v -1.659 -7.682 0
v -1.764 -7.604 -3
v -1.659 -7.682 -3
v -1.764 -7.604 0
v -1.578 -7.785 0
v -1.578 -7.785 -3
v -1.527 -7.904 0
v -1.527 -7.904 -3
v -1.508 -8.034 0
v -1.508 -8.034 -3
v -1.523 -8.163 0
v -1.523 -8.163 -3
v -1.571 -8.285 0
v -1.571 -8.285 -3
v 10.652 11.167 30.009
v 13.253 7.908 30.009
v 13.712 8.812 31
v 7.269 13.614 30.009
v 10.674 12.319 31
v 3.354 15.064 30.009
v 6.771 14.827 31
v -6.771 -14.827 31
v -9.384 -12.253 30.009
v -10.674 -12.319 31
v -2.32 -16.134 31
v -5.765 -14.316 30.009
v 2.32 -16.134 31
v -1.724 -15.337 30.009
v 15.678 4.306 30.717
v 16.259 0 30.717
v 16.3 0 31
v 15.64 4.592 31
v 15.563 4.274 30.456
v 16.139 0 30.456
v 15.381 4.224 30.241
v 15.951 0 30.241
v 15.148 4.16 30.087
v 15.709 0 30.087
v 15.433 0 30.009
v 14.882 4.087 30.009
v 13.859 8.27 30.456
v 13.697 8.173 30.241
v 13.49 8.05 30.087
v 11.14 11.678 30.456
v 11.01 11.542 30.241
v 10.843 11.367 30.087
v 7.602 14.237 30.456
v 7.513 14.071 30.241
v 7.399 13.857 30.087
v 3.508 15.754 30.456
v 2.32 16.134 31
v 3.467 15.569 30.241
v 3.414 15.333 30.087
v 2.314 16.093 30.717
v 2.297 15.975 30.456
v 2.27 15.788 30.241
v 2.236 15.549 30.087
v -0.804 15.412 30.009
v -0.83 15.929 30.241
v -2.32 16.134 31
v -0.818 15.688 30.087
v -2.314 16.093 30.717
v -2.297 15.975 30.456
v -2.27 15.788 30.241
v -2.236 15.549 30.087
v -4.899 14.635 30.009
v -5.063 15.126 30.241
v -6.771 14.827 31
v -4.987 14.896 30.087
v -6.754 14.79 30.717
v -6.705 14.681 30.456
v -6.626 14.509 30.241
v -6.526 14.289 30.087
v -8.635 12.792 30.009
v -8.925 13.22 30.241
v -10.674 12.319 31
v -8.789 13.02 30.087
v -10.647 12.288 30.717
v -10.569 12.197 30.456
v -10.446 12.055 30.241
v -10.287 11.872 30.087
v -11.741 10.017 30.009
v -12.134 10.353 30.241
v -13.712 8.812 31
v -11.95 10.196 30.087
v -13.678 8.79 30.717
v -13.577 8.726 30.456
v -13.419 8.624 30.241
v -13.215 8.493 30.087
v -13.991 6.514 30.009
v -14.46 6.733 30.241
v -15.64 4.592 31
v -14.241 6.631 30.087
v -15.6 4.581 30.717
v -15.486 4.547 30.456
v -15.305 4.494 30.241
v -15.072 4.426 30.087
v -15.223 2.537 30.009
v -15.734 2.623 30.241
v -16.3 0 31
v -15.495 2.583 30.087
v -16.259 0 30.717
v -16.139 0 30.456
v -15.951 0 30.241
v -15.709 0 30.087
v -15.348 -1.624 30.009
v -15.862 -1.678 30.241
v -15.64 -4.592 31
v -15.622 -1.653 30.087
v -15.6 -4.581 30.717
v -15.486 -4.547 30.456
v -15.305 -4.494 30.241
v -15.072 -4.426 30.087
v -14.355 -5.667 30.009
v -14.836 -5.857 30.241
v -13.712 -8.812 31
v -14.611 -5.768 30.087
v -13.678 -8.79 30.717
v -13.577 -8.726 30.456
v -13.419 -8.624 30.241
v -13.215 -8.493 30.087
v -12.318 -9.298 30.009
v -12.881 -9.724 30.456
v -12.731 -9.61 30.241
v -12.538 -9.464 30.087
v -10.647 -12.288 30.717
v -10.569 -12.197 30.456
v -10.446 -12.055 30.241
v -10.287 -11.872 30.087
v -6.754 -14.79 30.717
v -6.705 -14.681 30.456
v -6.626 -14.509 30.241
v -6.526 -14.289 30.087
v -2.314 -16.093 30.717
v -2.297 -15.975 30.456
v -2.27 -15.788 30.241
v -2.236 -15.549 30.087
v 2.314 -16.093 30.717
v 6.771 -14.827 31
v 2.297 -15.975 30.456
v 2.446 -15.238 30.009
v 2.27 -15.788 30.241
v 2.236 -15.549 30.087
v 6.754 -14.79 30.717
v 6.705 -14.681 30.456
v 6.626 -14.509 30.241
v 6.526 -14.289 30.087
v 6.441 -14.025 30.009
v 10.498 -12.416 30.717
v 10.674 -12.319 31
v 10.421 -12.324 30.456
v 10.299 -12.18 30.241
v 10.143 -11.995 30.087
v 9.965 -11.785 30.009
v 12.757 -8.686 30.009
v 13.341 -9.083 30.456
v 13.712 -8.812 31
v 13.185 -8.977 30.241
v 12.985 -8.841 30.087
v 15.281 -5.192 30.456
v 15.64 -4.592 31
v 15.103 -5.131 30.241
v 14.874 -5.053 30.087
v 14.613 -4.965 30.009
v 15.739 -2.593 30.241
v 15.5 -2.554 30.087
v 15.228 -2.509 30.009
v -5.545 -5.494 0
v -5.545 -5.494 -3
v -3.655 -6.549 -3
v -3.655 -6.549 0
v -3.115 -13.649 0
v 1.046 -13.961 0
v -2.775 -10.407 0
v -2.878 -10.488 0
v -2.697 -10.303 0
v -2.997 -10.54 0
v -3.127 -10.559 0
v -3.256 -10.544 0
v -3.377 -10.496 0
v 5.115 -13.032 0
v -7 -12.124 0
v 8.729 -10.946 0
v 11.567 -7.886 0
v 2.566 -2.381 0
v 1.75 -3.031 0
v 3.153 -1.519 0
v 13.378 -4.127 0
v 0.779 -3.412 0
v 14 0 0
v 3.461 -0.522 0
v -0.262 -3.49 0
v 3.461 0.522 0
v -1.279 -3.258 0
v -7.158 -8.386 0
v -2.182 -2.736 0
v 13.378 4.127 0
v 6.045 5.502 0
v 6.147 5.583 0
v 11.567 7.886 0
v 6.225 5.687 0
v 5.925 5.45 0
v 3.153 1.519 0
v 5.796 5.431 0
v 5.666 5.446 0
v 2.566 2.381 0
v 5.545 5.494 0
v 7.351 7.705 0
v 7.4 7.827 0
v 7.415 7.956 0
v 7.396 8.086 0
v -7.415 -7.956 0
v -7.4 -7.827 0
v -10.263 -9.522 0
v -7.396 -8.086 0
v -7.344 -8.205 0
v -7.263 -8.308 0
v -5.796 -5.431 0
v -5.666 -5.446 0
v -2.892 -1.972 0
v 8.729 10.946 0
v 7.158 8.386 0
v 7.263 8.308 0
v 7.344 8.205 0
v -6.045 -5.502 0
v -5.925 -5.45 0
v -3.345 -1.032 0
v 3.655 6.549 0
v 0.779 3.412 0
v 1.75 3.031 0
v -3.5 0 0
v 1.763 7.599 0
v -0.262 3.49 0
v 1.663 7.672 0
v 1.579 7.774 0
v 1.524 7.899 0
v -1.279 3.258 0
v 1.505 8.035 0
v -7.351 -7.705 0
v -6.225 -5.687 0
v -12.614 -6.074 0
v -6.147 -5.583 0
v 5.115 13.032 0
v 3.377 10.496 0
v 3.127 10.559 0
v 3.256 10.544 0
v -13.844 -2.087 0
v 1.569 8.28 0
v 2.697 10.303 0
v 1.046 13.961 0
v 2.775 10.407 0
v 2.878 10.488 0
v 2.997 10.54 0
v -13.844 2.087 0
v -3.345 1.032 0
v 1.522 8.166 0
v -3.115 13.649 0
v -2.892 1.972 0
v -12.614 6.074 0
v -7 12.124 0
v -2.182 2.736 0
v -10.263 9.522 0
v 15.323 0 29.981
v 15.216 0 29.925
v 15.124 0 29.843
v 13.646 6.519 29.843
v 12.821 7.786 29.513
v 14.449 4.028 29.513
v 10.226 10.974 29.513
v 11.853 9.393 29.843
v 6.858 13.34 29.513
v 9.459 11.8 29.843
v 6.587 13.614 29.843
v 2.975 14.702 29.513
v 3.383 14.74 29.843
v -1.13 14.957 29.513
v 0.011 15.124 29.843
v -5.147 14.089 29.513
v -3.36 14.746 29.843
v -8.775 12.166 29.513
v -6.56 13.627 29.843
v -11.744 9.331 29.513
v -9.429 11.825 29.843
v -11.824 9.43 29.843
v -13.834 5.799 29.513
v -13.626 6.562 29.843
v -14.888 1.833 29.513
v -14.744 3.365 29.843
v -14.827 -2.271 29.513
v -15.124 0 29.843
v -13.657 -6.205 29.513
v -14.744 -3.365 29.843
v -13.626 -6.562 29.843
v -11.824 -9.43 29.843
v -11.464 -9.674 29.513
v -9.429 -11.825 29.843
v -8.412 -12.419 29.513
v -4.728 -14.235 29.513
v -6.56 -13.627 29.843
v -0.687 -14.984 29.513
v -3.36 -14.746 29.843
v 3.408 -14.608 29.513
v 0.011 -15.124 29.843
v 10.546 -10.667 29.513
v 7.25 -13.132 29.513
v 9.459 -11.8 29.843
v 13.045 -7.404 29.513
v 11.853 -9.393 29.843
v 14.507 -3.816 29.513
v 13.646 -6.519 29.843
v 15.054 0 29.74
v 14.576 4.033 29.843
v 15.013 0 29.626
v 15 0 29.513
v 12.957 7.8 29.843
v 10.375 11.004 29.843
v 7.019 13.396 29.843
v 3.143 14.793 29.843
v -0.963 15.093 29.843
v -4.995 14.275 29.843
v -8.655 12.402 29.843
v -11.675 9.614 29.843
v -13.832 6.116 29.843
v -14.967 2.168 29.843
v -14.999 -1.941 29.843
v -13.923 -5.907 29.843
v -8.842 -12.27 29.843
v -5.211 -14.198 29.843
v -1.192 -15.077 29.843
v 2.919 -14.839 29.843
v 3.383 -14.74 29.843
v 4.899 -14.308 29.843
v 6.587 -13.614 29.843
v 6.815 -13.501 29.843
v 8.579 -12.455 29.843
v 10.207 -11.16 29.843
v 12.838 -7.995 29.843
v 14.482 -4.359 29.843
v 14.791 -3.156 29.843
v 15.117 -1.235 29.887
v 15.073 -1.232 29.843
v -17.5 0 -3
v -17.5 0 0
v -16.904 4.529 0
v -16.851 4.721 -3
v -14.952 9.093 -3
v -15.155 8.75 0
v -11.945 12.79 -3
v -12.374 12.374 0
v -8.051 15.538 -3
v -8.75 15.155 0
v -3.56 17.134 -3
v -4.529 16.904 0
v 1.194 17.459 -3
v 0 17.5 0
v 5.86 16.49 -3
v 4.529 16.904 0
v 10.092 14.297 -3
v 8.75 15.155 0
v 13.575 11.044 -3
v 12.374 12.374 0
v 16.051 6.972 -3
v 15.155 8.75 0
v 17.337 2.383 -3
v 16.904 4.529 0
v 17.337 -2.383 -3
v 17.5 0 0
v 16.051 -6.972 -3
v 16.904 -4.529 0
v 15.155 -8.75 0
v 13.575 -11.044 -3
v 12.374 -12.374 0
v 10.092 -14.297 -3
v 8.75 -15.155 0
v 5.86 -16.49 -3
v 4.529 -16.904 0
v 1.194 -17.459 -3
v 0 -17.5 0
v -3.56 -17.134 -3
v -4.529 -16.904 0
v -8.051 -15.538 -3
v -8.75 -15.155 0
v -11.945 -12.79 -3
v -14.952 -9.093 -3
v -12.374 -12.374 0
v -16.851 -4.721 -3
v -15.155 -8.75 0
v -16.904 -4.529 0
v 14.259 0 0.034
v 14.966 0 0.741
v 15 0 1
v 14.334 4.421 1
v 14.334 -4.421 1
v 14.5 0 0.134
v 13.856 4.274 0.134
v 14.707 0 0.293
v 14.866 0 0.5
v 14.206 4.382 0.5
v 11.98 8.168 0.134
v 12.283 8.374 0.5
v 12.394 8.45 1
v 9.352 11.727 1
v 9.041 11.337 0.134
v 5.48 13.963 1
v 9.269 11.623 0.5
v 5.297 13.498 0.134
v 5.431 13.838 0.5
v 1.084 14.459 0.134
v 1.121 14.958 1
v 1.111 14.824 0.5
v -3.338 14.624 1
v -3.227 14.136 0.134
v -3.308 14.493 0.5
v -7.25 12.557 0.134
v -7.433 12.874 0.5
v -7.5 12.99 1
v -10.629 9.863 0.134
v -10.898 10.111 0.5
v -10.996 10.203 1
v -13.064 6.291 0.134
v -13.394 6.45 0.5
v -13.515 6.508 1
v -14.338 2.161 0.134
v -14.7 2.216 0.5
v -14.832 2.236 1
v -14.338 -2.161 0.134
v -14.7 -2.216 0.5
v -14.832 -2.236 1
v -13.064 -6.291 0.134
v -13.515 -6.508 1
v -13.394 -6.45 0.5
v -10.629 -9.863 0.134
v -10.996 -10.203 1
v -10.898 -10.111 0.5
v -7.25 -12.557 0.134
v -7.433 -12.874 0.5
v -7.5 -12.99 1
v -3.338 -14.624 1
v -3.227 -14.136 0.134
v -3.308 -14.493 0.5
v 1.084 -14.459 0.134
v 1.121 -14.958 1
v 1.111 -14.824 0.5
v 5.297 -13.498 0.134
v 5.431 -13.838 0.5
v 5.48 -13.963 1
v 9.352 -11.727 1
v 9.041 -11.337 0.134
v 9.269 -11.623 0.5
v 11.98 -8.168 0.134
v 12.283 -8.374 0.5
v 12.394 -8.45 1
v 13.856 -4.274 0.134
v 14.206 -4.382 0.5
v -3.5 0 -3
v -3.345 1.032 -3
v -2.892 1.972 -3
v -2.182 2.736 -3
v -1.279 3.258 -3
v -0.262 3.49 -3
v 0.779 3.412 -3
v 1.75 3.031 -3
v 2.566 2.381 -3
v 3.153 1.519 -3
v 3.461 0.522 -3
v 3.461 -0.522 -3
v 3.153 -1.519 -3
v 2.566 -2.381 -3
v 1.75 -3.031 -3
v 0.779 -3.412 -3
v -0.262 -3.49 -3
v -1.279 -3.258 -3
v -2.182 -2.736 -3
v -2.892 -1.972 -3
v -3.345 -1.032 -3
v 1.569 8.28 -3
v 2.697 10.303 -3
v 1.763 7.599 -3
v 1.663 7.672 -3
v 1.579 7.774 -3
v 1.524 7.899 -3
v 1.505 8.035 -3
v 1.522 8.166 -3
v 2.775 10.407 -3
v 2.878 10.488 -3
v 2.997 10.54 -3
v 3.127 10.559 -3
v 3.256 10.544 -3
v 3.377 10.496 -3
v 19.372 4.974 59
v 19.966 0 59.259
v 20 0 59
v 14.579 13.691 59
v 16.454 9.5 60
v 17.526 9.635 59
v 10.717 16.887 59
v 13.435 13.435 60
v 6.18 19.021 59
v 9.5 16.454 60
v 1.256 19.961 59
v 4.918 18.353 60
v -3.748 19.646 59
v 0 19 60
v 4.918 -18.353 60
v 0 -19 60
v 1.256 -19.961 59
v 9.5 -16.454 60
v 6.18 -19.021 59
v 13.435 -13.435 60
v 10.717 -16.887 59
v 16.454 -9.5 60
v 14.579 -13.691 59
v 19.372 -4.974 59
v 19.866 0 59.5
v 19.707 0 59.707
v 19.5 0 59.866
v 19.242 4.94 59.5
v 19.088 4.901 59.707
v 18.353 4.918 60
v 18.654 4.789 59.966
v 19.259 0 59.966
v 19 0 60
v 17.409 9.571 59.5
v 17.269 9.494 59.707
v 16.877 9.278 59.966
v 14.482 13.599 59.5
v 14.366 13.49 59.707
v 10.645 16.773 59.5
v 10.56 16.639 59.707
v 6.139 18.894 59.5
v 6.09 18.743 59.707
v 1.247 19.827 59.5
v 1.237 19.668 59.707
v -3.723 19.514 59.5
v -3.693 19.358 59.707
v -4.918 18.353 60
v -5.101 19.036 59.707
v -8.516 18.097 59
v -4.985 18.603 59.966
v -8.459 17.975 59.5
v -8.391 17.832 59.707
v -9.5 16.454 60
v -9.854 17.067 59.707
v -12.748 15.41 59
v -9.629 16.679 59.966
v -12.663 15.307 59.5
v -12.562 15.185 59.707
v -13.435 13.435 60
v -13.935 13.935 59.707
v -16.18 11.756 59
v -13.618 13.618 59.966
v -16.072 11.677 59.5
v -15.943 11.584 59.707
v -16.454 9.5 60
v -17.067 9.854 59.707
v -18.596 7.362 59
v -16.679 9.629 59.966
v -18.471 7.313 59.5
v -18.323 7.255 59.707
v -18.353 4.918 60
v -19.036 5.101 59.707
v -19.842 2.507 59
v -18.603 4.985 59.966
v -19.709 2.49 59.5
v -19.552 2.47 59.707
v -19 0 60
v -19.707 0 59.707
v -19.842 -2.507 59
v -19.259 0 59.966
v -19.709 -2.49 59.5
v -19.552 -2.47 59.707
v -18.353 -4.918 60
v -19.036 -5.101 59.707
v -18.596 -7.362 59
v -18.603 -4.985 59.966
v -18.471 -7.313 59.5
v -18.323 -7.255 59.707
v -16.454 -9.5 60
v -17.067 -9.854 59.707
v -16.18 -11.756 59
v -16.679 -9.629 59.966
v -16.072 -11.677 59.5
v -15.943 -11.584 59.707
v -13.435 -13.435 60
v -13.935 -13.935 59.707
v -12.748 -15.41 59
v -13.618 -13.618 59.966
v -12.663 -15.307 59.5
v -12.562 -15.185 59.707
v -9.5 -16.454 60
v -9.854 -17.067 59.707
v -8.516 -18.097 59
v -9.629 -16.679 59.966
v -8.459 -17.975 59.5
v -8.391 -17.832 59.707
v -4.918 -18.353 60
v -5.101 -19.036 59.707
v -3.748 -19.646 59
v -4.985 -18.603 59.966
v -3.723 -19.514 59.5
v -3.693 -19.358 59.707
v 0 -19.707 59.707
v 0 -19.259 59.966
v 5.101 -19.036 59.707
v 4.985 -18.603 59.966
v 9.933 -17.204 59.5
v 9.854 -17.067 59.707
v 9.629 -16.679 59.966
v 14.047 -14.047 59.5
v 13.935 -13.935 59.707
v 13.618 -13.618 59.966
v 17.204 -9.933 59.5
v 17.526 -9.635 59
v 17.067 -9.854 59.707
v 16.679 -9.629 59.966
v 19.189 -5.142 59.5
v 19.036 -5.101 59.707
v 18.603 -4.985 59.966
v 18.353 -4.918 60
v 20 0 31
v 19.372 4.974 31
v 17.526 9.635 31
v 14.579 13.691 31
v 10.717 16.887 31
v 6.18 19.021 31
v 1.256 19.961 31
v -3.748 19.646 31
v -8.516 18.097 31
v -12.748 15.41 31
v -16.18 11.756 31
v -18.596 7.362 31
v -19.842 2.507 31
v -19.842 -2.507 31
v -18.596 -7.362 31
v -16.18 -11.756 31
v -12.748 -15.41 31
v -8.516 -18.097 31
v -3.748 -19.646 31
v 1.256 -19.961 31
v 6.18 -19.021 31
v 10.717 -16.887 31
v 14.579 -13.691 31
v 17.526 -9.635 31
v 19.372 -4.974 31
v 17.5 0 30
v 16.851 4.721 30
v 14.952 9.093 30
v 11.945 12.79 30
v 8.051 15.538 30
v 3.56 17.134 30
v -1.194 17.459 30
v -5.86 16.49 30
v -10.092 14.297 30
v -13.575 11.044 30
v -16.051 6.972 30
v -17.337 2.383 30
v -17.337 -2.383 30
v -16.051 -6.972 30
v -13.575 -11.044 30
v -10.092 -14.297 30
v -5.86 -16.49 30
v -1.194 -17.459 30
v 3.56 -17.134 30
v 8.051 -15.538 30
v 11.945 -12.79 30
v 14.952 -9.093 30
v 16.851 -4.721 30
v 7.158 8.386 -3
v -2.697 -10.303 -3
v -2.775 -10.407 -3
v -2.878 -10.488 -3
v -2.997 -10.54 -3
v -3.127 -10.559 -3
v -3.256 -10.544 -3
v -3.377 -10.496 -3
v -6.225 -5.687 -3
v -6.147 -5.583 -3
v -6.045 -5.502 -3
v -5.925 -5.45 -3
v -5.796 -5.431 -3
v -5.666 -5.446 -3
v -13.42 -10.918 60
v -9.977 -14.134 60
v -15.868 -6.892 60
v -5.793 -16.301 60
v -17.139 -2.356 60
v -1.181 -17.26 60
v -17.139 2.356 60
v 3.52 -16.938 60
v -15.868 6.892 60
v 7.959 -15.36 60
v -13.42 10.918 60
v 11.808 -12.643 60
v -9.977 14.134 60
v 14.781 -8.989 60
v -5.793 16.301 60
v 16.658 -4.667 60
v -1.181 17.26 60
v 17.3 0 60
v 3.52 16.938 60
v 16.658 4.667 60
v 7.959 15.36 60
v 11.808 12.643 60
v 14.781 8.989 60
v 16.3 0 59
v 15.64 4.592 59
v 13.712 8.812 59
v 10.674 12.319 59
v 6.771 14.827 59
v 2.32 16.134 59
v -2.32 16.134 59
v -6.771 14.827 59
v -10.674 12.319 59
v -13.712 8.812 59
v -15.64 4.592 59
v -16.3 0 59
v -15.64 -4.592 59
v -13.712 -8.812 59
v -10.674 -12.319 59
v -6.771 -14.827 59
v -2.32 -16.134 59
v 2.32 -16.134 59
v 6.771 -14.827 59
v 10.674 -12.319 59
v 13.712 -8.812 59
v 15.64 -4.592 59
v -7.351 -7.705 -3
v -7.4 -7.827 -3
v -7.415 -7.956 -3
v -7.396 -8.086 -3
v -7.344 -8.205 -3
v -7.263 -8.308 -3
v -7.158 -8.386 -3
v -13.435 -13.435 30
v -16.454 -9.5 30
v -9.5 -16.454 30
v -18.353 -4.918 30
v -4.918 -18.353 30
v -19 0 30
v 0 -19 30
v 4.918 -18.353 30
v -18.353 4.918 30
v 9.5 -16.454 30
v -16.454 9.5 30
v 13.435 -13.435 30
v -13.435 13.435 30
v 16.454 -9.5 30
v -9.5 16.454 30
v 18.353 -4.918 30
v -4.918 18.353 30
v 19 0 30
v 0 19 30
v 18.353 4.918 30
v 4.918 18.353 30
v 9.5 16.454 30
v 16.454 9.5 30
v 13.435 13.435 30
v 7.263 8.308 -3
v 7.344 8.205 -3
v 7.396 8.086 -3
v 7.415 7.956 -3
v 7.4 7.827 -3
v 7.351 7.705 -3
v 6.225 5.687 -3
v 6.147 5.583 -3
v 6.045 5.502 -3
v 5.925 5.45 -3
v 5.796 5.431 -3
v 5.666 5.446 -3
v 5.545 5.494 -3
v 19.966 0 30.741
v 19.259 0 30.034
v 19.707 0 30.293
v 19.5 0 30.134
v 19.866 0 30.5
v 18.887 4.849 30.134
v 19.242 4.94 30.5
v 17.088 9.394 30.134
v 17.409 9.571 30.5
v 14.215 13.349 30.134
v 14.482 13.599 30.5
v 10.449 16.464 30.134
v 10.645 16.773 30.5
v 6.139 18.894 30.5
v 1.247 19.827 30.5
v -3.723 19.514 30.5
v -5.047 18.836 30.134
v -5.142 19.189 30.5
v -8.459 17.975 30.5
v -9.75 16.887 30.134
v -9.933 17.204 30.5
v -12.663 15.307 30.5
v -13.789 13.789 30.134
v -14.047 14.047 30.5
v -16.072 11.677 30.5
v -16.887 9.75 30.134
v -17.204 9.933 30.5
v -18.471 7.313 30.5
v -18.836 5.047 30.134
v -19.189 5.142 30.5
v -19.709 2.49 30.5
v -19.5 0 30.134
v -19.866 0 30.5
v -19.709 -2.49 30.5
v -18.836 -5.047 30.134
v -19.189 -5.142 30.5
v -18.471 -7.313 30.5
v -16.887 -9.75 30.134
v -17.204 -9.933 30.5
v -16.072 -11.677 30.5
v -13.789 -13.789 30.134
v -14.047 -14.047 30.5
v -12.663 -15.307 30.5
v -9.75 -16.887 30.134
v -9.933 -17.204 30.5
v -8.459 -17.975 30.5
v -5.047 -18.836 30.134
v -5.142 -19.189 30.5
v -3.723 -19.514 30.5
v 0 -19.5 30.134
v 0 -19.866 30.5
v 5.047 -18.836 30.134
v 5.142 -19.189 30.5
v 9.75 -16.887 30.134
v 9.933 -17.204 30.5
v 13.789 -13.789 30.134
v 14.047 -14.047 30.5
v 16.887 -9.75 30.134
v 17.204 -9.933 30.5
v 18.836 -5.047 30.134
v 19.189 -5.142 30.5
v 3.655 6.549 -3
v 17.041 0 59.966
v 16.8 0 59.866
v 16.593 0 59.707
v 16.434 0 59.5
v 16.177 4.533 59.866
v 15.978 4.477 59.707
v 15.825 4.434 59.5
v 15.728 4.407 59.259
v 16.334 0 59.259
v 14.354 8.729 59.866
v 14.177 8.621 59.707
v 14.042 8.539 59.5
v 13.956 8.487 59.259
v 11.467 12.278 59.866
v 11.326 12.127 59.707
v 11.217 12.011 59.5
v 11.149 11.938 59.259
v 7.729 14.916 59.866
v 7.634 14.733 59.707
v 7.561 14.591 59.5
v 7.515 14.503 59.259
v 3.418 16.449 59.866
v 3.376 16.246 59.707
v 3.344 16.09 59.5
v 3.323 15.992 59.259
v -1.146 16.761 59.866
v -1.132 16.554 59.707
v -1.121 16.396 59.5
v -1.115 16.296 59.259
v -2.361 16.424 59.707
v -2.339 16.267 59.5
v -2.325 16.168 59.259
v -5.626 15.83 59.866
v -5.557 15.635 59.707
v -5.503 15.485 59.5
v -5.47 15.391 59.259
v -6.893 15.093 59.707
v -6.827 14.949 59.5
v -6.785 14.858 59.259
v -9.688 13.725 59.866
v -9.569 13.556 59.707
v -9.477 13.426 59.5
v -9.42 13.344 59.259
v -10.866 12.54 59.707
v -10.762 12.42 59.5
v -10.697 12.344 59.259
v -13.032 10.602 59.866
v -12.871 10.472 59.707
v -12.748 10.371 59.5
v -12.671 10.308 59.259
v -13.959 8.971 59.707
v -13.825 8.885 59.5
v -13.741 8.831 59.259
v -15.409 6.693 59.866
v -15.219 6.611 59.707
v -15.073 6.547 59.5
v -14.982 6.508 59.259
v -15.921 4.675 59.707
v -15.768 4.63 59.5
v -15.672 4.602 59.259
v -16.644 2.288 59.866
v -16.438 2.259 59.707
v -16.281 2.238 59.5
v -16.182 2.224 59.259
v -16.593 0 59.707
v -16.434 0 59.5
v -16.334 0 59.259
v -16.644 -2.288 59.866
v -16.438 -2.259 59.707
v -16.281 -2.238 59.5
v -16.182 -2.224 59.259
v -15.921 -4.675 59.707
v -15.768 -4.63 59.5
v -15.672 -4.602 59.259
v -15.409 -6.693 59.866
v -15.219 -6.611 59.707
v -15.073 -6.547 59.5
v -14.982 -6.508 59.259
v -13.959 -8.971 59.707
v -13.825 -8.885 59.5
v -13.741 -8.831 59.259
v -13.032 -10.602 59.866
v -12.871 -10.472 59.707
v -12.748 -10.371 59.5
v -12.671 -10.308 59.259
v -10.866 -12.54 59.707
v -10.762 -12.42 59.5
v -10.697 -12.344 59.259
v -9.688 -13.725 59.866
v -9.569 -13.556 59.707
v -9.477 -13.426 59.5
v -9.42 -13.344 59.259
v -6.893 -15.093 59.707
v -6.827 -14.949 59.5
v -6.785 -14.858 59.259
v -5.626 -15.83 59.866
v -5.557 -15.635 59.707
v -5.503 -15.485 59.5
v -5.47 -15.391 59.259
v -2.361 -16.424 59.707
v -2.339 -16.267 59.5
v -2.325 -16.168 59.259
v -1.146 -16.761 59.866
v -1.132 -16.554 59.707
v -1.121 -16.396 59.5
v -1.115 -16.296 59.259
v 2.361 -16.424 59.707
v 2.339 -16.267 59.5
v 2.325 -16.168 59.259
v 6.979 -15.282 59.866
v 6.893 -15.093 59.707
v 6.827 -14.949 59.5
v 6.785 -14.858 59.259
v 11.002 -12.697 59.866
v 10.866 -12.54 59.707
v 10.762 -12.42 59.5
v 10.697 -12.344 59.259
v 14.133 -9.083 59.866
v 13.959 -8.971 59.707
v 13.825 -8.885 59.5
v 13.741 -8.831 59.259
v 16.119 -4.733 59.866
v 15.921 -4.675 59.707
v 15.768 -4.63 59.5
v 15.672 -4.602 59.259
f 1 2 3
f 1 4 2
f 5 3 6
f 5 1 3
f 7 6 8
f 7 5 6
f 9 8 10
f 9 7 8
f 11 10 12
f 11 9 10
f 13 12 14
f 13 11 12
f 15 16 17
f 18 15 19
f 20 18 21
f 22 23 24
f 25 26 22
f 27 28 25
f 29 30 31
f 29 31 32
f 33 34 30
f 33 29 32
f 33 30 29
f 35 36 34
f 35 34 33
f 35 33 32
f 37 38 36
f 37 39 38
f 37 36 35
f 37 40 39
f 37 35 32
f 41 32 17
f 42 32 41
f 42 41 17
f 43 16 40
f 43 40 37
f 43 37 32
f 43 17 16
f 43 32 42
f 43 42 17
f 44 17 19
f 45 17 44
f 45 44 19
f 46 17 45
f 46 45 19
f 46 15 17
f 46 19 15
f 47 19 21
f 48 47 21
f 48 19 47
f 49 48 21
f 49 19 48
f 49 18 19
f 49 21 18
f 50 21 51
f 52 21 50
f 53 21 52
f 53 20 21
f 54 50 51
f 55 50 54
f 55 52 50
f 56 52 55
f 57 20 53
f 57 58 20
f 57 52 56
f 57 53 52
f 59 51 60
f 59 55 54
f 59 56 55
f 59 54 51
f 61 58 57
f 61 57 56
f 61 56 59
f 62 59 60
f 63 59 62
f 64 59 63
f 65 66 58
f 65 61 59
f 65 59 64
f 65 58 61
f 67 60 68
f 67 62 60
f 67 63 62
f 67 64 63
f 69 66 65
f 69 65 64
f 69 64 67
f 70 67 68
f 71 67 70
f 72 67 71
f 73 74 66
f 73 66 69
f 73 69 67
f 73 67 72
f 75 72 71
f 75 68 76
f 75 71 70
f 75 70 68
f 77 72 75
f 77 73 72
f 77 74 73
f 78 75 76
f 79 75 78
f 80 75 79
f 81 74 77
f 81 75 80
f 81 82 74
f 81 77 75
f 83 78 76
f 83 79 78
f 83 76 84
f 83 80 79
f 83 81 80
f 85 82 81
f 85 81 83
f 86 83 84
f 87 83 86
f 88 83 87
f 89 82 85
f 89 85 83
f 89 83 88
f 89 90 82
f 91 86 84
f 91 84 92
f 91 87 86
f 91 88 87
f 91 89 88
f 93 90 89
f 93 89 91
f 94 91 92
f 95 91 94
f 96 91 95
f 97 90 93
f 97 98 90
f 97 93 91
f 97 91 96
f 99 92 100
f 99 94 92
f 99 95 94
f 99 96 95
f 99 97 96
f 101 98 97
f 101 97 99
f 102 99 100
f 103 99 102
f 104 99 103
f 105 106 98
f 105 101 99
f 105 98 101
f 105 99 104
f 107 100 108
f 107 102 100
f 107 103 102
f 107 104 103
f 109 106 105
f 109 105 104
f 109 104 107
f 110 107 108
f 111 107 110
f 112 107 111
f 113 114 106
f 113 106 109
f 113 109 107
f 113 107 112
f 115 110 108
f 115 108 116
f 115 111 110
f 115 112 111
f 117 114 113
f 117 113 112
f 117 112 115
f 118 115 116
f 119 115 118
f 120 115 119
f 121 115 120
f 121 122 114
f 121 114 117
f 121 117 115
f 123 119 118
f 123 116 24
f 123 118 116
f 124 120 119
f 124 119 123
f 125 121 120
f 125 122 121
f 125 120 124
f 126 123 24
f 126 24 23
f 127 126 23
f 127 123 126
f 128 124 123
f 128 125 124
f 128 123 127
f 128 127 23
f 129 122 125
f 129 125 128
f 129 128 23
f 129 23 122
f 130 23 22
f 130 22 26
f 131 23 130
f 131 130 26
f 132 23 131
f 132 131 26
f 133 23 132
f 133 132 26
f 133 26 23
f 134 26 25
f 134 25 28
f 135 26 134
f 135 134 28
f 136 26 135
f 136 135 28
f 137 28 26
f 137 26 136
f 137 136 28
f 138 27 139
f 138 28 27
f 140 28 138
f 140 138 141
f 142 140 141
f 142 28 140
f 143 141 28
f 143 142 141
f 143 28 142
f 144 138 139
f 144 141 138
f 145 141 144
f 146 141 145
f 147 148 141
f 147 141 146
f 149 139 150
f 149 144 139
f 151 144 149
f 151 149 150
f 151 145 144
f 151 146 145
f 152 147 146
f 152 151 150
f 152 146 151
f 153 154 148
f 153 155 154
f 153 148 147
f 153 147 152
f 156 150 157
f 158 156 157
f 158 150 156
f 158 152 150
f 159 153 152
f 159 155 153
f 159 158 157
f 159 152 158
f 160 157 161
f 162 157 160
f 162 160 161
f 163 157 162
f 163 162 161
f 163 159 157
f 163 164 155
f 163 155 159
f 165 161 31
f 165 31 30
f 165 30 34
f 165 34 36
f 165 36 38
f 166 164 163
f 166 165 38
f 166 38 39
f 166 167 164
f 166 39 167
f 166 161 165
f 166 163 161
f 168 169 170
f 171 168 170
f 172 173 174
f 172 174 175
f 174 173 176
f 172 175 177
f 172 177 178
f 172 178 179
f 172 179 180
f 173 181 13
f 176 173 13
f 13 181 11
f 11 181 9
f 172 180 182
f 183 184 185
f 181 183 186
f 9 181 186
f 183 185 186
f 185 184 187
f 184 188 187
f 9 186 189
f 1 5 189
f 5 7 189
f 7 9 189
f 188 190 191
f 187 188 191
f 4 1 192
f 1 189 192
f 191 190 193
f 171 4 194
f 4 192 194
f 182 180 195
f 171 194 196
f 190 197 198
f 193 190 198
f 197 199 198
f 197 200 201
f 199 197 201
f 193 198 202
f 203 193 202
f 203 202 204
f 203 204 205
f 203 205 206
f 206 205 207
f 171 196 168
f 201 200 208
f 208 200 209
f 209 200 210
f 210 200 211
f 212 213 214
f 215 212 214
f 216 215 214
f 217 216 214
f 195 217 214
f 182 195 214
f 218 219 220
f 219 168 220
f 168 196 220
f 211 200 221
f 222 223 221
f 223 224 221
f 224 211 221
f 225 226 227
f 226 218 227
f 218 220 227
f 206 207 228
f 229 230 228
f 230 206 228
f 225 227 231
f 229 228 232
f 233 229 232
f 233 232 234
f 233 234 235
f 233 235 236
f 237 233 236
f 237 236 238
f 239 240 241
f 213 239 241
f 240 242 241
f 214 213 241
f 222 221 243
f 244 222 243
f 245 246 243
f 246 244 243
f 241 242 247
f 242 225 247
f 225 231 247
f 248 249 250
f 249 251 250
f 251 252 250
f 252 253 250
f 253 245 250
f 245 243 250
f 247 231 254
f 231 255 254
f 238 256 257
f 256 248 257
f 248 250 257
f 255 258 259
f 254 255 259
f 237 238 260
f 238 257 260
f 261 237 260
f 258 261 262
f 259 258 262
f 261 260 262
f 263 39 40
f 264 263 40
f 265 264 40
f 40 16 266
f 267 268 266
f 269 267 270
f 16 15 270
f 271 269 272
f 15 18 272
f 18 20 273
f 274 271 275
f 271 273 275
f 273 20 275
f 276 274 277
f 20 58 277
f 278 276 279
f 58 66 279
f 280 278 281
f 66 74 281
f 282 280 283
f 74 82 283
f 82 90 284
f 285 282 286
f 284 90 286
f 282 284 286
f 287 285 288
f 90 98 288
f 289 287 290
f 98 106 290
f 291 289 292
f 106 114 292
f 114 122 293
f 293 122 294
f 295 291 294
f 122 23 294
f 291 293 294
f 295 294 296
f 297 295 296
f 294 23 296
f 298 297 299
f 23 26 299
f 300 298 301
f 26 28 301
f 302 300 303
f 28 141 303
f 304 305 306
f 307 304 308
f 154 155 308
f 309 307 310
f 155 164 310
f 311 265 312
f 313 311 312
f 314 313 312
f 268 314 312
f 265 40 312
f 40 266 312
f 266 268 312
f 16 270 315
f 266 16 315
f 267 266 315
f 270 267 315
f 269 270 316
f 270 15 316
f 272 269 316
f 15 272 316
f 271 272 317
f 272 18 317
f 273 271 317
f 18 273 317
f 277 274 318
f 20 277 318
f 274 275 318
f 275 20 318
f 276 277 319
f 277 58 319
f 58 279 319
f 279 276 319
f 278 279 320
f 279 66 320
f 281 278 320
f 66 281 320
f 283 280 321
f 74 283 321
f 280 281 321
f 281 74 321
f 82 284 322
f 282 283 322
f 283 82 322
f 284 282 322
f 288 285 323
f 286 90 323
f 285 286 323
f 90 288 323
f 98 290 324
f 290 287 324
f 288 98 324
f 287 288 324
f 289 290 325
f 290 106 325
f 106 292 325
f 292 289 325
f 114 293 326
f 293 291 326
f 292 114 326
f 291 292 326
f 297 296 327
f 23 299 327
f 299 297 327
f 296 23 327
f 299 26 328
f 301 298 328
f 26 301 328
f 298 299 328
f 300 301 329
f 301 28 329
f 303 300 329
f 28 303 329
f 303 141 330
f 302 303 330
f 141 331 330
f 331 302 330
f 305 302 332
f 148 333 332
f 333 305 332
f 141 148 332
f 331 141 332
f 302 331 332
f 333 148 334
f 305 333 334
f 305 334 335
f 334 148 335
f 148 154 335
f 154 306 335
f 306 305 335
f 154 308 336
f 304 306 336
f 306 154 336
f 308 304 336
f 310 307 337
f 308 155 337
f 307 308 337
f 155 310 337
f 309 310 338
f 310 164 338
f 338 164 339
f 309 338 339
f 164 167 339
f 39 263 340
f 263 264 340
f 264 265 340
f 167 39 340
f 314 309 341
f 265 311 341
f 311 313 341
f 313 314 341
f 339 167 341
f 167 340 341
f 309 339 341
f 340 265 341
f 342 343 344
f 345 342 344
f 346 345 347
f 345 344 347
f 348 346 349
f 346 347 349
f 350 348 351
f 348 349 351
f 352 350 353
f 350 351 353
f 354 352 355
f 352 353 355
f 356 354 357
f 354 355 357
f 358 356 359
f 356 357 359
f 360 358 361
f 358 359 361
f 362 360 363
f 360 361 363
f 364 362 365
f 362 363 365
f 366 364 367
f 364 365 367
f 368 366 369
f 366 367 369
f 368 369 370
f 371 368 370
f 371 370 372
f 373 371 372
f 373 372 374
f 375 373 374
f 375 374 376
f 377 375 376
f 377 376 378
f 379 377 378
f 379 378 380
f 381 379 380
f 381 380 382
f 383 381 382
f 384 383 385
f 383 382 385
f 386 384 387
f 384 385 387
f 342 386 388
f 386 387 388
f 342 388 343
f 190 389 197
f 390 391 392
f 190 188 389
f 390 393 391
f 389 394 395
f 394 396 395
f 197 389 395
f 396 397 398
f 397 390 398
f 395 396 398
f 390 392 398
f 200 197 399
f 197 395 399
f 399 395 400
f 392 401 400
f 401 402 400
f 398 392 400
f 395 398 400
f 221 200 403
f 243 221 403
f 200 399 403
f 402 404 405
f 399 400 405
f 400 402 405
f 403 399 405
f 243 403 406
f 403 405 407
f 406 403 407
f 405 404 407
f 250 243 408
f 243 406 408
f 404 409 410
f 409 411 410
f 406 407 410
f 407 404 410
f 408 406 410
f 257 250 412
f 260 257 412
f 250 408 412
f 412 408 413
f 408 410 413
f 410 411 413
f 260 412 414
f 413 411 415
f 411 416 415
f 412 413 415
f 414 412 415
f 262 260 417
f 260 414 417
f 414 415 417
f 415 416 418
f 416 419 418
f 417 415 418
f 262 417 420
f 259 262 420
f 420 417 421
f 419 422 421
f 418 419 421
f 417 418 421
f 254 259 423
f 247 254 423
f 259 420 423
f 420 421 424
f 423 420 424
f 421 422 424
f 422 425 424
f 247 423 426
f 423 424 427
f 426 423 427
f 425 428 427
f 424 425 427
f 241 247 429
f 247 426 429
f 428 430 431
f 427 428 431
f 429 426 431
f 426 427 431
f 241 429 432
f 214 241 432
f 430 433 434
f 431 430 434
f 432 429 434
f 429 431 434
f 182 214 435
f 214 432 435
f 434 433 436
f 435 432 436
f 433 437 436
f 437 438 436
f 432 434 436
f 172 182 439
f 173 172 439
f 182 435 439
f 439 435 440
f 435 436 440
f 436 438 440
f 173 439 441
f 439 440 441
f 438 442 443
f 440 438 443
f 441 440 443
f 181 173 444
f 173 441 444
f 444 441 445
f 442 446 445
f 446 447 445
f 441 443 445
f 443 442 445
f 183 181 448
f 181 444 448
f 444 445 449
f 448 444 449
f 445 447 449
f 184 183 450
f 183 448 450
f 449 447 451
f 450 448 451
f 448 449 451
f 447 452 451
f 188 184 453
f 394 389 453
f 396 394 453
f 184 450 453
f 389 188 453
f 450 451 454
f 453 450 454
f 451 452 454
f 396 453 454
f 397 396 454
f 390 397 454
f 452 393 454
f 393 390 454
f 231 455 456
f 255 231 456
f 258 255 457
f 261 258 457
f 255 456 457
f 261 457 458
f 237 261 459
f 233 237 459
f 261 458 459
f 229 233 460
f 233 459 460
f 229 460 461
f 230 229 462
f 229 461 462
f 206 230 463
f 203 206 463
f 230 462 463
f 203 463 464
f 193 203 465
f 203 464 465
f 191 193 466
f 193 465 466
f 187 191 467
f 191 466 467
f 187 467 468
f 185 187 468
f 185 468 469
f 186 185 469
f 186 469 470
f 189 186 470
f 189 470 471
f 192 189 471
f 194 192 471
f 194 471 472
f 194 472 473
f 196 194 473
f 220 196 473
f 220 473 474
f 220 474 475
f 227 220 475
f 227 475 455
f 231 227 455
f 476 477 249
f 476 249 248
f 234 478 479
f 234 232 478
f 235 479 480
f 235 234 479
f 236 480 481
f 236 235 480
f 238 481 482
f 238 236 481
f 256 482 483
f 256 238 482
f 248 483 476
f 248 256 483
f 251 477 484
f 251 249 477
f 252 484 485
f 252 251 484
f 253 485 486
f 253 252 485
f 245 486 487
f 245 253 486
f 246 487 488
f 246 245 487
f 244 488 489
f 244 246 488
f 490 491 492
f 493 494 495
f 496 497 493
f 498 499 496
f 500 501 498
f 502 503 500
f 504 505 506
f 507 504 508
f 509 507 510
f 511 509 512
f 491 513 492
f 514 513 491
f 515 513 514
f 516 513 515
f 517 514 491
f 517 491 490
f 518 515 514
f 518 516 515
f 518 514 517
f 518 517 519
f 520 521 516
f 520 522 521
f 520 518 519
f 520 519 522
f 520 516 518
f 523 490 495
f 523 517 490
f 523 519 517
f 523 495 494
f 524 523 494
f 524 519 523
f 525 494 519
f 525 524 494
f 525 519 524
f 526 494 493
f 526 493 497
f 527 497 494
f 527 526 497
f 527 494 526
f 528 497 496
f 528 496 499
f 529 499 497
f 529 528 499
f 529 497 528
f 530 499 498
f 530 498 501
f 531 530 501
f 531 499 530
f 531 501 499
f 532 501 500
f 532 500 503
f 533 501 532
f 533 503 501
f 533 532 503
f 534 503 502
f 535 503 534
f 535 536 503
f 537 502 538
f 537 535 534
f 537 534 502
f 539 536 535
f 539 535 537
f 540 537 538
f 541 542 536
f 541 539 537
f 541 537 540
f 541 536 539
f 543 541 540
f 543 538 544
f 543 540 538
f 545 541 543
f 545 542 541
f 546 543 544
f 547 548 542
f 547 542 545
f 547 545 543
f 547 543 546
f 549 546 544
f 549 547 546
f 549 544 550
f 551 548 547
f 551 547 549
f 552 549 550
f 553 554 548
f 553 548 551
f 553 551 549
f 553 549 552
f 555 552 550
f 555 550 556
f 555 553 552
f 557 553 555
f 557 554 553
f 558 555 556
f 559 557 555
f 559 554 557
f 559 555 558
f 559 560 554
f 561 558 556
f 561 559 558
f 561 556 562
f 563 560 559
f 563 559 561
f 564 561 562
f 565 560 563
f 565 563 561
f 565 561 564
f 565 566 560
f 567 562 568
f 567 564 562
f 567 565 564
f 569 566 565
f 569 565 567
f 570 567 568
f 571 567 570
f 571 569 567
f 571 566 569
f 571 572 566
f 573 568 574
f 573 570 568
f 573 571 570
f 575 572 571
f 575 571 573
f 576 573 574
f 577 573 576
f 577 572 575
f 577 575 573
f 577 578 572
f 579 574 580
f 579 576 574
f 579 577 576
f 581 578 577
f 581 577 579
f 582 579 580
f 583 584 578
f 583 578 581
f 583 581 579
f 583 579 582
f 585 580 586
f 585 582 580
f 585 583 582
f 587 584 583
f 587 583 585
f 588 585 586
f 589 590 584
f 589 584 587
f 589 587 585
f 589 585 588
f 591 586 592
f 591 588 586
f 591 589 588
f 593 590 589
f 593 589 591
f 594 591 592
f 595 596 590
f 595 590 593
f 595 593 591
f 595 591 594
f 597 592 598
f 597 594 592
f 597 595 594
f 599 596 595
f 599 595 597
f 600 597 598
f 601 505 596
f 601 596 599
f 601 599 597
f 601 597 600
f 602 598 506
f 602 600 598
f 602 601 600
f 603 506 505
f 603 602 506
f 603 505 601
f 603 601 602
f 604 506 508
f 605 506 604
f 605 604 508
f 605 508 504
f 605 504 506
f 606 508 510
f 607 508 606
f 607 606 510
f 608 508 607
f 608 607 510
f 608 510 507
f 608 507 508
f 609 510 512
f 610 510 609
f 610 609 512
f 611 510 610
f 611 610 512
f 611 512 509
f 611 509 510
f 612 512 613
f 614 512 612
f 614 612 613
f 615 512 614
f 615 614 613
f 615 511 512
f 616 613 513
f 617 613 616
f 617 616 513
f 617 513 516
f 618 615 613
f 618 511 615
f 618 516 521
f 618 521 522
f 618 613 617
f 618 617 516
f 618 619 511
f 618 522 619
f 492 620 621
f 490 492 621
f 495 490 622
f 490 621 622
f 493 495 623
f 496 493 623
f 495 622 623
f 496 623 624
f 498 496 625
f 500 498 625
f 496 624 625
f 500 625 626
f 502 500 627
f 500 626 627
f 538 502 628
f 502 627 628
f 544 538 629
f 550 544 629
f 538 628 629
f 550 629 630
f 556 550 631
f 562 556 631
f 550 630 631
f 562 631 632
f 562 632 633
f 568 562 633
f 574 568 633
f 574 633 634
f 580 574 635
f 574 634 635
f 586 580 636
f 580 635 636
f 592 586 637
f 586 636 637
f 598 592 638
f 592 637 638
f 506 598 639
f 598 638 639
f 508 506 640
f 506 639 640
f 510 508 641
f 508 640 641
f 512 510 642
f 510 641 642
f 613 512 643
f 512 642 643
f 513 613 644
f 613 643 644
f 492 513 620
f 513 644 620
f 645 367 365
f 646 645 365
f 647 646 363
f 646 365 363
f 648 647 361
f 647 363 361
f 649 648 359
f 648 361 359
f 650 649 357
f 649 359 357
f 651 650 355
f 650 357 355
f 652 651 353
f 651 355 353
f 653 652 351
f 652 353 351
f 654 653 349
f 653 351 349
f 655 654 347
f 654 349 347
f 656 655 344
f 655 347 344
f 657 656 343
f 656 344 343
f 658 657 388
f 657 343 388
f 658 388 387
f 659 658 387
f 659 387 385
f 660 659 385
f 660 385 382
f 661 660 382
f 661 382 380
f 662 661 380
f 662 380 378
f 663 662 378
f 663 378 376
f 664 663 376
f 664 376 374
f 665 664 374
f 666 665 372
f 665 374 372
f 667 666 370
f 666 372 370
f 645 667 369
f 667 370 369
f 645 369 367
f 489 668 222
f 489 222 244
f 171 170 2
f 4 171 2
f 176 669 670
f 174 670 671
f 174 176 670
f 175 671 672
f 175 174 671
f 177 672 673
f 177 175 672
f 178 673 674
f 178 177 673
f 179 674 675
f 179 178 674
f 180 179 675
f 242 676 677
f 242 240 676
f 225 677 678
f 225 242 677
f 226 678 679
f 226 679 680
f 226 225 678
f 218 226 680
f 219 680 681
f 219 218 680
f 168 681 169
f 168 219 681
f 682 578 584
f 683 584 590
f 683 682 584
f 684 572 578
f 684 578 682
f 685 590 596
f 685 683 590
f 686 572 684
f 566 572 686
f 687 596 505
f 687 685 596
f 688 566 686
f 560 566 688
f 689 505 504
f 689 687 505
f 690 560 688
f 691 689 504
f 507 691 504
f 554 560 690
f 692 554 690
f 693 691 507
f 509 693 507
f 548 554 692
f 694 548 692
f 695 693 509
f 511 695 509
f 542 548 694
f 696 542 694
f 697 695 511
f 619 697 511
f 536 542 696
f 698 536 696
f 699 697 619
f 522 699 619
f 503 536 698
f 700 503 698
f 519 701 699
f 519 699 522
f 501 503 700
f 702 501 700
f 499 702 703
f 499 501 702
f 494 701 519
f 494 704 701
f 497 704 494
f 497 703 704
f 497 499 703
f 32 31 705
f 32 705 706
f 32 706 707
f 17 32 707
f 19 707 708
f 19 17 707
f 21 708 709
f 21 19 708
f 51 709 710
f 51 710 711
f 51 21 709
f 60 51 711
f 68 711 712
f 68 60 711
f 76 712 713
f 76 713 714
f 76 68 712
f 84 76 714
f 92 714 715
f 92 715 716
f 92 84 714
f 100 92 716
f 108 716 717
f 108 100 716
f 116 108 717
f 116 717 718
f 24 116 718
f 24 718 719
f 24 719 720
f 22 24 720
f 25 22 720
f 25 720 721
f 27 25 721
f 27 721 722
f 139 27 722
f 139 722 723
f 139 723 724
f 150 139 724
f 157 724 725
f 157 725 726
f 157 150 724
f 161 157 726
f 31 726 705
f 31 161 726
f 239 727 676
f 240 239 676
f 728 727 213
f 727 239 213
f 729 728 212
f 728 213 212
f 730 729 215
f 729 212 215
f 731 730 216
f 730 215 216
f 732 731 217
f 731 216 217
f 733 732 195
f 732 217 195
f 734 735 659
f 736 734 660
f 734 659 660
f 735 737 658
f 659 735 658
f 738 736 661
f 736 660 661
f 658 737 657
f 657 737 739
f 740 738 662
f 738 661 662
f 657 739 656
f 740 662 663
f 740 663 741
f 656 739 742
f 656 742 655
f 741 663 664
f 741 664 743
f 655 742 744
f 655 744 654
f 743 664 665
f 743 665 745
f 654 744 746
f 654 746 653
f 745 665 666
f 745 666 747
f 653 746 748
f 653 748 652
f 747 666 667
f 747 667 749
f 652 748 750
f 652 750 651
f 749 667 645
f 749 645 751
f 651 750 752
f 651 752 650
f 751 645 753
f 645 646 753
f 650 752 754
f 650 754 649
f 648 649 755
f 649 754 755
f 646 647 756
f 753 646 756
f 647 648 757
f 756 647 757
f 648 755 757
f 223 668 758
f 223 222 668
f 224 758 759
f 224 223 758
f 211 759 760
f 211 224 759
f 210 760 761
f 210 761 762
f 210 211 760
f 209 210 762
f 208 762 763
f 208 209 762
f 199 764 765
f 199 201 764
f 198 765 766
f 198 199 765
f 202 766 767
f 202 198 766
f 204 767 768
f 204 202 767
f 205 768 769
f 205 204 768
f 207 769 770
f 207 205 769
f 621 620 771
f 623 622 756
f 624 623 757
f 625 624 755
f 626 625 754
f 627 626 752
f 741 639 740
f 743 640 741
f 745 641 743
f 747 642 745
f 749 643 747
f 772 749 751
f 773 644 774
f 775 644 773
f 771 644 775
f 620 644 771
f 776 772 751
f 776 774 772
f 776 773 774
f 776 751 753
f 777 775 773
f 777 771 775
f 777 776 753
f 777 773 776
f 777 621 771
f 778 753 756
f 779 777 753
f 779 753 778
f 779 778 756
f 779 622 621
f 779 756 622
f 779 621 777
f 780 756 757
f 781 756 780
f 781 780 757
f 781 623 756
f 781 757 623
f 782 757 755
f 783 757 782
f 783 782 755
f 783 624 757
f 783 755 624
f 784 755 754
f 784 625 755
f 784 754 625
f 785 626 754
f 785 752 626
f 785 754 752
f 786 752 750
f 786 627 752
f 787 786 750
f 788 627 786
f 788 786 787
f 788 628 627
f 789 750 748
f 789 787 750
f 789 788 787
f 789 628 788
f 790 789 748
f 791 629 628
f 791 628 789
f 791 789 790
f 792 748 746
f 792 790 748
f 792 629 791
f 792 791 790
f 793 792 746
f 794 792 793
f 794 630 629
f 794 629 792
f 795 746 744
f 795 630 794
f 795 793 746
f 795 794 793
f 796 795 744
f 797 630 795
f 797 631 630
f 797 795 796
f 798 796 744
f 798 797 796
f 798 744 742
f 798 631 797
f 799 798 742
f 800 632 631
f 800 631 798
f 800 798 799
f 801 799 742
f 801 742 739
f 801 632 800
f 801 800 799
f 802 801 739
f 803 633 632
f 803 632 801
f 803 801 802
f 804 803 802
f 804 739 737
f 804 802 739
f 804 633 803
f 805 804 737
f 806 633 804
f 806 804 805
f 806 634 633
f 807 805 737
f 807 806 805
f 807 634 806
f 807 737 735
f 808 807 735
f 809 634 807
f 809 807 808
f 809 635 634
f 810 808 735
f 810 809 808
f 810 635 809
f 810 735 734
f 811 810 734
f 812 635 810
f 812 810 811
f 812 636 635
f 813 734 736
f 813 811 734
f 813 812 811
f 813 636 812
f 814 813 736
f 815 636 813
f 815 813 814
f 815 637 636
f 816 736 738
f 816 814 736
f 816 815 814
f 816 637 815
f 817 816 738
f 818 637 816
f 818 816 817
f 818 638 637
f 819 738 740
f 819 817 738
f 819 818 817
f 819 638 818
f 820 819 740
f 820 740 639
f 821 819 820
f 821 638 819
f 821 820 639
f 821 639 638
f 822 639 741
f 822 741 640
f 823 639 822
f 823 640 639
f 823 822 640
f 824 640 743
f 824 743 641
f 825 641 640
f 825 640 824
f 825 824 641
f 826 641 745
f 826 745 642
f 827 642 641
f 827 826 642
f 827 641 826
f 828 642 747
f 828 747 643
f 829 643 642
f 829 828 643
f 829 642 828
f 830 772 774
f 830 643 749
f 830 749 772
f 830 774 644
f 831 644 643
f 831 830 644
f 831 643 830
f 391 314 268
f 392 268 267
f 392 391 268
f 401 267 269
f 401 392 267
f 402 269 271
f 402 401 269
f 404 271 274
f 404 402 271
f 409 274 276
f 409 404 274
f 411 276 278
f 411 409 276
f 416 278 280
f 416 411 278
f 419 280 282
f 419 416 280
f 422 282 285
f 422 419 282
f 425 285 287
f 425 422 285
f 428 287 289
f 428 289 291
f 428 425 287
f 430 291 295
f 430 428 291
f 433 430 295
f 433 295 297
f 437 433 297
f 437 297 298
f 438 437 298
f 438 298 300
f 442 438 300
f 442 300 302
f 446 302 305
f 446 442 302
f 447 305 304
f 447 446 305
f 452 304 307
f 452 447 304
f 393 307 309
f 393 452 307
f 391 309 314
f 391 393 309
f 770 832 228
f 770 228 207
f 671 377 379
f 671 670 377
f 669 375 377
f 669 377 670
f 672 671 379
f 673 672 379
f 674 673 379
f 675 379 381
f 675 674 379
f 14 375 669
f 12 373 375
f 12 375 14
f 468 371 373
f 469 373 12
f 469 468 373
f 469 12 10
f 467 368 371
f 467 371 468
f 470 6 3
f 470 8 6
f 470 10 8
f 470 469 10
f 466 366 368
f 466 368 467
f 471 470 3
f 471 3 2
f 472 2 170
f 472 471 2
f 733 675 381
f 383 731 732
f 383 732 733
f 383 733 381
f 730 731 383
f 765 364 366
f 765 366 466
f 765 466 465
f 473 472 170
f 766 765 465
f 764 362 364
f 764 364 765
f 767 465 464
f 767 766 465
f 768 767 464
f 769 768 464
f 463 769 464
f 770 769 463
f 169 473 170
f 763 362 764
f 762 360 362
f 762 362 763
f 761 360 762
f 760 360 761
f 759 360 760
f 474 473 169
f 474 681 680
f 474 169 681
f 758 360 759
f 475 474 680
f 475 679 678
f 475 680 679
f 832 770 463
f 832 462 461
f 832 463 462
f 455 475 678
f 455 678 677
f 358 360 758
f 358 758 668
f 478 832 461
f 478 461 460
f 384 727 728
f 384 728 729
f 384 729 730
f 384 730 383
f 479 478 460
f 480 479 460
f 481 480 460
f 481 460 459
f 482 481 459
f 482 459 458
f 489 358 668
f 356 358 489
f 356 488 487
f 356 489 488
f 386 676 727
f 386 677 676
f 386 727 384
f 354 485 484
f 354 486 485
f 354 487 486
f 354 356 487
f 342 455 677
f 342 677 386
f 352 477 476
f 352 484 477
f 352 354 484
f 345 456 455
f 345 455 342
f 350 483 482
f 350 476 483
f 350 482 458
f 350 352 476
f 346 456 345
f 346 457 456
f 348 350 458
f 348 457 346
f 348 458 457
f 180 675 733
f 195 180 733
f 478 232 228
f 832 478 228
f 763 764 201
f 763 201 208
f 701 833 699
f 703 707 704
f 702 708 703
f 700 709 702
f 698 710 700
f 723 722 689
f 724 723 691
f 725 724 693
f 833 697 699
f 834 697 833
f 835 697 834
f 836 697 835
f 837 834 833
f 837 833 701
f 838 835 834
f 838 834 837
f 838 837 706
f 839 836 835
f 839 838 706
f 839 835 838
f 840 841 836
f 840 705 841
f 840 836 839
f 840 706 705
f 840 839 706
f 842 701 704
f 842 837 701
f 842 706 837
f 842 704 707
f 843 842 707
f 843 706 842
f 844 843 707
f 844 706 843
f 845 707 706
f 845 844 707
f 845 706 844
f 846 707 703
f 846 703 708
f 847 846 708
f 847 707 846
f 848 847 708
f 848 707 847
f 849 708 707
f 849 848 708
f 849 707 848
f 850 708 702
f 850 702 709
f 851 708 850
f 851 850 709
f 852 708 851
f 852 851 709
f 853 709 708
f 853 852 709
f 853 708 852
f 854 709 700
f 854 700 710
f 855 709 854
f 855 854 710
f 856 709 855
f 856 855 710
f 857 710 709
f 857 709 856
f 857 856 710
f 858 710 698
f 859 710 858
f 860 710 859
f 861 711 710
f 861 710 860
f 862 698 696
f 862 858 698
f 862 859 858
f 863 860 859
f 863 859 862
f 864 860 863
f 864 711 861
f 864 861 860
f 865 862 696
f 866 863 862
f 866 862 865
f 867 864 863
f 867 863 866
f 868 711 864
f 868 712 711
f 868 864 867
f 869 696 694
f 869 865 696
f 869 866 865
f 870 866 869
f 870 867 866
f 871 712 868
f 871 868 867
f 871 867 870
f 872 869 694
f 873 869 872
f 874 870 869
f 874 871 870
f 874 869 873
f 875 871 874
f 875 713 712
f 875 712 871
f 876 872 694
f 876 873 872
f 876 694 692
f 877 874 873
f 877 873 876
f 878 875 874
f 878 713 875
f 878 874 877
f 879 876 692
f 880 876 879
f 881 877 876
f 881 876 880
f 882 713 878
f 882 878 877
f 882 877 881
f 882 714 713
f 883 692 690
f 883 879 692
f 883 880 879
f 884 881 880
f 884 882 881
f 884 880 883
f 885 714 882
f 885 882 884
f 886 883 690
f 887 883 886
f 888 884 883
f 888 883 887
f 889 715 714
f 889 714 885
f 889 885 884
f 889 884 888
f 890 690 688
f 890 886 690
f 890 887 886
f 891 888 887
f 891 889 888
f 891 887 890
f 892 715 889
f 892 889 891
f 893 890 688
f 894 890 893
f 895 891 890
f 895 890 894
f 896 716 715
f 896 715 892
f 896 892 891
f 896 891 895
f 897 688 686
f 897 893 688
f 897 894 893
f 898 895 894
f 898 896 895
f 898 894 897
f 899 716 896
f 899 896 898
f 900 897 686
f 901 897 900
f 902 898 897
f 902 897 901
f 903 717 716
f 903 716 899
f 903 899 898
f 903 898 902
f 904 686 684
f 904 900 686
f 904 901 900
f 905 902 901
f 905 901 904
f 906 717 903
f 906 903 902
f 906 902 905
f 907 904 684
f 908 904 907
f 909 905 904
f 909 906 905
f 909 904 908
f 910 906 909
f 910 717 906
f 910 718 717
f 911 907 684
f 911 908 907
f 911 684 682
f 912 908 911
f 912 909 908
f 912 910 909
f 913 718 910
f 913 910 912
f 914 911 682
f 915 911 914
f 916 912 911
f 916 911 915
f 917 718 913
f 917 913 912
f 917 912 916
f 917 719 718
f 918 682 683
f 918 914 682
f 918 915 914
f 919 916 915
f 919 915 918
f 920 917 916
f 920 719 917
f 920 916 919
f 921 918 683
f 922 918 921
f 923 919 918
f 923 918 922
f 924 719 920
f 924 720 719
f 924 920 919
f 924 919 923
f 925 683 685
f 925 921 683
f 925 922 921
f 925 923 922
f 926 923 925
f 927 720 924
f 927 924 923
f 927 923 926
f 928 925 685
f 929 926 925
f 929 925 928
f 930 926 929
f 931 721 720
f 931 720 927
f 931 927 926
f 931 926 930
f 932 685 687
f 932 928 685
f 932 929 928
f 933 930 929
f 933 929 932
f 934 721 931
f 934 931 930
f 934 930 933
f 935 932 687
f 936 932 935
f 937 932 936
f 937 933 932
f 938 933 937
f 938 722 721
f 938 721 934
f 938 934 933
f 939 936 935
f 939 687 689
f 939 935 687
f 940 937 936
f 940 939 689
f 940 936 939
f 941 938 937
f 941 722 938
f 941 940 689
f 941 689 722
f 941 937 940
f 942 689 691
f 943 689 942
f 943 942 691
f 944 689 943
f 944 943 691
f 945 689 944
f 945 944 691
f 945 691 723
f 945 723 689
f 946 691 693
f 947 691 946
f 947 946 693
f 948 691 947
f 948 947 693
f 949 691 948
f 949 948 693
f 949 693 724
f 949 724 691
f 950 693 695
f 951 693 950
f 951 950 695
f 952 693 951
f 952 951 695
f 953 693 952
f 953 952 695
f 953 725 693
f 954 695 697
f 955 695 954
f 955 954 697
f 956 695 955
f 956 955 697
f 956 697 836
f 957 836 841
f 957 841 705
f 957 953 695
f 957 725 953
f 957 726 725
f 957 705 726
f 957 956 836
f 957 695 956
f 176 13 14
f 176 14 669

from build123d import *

# Parameters (mm, degrees)
SKETCH1_R           = 17.5
SKETCH1_R_2         = 15
BOSS_EXTRUDE1_DEPTH = 30
SKETCH2_R           = 20
SKETCH2_R_2         = 16.3
BOSS_EXTRUDE2_DEPTH = 30
SKETCH3_R           = 17.5
BOSS_EXTRUDE3_DEPTH = 3
CUT_EXTRUDE1_DEPTH  = 64
FILLET1_R           = 0.5
SKETCH5_R           = 3.5
CUT_EXTRUDE2_DEPTH  = 64
FILLET2_R           = 1
FILLET4_R           = 1
FILLET5_R           = 0.5


with BuildPart() as part:
    # Sketch1 → Boss-Extrude1 (new body)
    with BuildSketch(Plane.XY):
        Circle(SKETCH1_R)
        Circle(SKETCH1_R_2, mode=Mode.SUBTRACT)
    extrude(amount=BOSS_EXTRUDE1_DEPTH)

    # Sketch2 → Boss-Extrude2 (add)
    with BuildSketch(Plane.XY.offset(30)):
        Circle(SKETCH2_R)
        Circle(SKETCH2_R_2, mode=Mode.SUBTRACT)
    extrude(amount=BOSS_EXTRUDE2_DEPTH)

    # Sketch3 → Boss-Extrude3 (add)
    with BuildSketch(Plane(origin=(0, 0, 0), x_dir=(-1, 0, 0), z_dir=(0, 0, -1))):
        Circle(SKETCH3_R)
    extrude(amount=BOSS_EXTRUDE3_DEPTH)

    # Sketch4 → Cut-Extrude1 (cut, through all)
    with BuildSketch(Plane(origin=(0, 0, -3), x_dir=(-1, 0, 0), z_dir=(0, 0, -1))):
        Polygon((7.595087952, -8.142047722), (5.981728577, -5.25077993), (3.65460456, -6.549340845), (1.327480543, -7.847901761), (2.940839919, -10.739169553), align=None)
        Polygon((-1.327480543, 7.847901761), (-1.324474409, 7.842514531), (-3.65460456, 6.549340845), (-5.981728577, 5.25077993), (-7.595087952, 8.142047722), (-2.940839919, 10.739169553), align=None)
    extrude(amount=-CUT_EXTRUDE1_DEPTH, mode=Mode.SUBTRACT)

    # Fillet1
    fillet1_edges = [part.edges().sort_by_distance(p)[0] for p in [
        (-5.981728577, -5.25077993, -1.5),
        (-7.595087952, -8.142047722, -1.5),
        (-2.940839919, -10.739169553, -1.5),
        (-1.327480543, -7.847901761, -1.5),
        (2.940839919, 10.739169553, -1.5),
        (1.324474409, 7.842514531, -1.5),
        (5.981728577, 5.25077993, -1.5),
        (7.595087952, 8.142047722, -1.5),
    ]]
    fillet(fillet1_edges, radius=FILLET1_R)

    # Sketch5 → Cut-Extrude2 (cut, through all)
    with BuildSketch(Plane(origin=(0, 0, -3), x_dir=(-1, 0, 0), z_dir=(0, 0, -1))):
        Circle(SKETCH5_R)
    extrude(amount=-CUT_EXTRUDE2_DEPTH, mode=Mode.SUBTRACT)

    # Fillet2
    fillet2_edges = [part.edges().sort_by_distance(p)[0] for p in [
        (-20, 0, 60),
        (-20, 0, 30),
    ]]
    fillet(fillet2_edges, radius=FILLET2_R)

    # Fillet4
    fillet4_edges = [part.edges().sort_by_distance(p)[0] for p in [
        (-16.3, 0, 30),
        (-16.3, 0, 60),
        (-15, 0, 0),
    ]]
    fillet(fillet4_edges, radius=FILLET4_R)

    # Fillet5
    fillet5_edges = [part.edges().sort_by_distance(p)[0] for p in [
        (-15, 0, 30),
    ]]
    fillet(fillet5_edges, radius=FILLET5_R)


solid = part.part
